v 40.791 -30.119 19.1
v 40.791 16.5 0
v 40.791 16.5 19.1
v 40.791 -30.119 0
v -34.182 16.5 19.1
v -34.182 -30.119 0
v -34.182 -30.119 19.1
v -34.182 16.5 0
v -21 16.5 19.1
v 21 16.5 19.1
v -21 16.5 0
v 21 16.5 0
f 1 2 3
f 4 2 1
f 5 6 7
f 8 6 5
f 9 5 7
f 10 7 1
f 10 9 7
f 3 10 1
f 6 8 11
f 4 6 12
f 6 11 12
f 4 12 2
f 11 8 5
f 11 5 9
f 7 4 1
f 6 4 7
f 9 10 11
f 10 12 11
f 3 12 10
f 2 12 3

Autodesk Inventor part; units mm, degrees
ref_plane "YZ Plane" through (0, 0, 0) normal (1, 0, 0) x (0, 1, 0)
ref_plane "XZ Plane" through (0, 0, 0) normal (0, 1, 0) x (-1, 0, 0)
ref_plane "XY Plane" through (0, 0, 0) normal (0, 0, 1) x (1, 0, 0)
ref_plane "Work Plane1" through (0, 0, 0) normal (0, 0, 1) x (1, 0, 0)
sketch "Sketch1" plane through (0, 0, 0) normal (0, 0, 1) x (1, 0, 0)
  line L0 (-34.1821, 16.5) -> (40.7911, 16.5)
  line L1 (40.7911, 16.5) -> (40.7911, -30.1193)
  line L2 (40.7911, -30.1193) -> (-34.1821, -30.1193)
  line L3 (-34.1821, -30.1193) -> (-34.1821, 16.5)
  line L4 (21, 16.5) -> (-21, 16.5) projected
  point P0 (0, 0)
extrude "Extrusion1" add sketch "Sketch1" along normal blind 19.1
properties part number "Shelf"
